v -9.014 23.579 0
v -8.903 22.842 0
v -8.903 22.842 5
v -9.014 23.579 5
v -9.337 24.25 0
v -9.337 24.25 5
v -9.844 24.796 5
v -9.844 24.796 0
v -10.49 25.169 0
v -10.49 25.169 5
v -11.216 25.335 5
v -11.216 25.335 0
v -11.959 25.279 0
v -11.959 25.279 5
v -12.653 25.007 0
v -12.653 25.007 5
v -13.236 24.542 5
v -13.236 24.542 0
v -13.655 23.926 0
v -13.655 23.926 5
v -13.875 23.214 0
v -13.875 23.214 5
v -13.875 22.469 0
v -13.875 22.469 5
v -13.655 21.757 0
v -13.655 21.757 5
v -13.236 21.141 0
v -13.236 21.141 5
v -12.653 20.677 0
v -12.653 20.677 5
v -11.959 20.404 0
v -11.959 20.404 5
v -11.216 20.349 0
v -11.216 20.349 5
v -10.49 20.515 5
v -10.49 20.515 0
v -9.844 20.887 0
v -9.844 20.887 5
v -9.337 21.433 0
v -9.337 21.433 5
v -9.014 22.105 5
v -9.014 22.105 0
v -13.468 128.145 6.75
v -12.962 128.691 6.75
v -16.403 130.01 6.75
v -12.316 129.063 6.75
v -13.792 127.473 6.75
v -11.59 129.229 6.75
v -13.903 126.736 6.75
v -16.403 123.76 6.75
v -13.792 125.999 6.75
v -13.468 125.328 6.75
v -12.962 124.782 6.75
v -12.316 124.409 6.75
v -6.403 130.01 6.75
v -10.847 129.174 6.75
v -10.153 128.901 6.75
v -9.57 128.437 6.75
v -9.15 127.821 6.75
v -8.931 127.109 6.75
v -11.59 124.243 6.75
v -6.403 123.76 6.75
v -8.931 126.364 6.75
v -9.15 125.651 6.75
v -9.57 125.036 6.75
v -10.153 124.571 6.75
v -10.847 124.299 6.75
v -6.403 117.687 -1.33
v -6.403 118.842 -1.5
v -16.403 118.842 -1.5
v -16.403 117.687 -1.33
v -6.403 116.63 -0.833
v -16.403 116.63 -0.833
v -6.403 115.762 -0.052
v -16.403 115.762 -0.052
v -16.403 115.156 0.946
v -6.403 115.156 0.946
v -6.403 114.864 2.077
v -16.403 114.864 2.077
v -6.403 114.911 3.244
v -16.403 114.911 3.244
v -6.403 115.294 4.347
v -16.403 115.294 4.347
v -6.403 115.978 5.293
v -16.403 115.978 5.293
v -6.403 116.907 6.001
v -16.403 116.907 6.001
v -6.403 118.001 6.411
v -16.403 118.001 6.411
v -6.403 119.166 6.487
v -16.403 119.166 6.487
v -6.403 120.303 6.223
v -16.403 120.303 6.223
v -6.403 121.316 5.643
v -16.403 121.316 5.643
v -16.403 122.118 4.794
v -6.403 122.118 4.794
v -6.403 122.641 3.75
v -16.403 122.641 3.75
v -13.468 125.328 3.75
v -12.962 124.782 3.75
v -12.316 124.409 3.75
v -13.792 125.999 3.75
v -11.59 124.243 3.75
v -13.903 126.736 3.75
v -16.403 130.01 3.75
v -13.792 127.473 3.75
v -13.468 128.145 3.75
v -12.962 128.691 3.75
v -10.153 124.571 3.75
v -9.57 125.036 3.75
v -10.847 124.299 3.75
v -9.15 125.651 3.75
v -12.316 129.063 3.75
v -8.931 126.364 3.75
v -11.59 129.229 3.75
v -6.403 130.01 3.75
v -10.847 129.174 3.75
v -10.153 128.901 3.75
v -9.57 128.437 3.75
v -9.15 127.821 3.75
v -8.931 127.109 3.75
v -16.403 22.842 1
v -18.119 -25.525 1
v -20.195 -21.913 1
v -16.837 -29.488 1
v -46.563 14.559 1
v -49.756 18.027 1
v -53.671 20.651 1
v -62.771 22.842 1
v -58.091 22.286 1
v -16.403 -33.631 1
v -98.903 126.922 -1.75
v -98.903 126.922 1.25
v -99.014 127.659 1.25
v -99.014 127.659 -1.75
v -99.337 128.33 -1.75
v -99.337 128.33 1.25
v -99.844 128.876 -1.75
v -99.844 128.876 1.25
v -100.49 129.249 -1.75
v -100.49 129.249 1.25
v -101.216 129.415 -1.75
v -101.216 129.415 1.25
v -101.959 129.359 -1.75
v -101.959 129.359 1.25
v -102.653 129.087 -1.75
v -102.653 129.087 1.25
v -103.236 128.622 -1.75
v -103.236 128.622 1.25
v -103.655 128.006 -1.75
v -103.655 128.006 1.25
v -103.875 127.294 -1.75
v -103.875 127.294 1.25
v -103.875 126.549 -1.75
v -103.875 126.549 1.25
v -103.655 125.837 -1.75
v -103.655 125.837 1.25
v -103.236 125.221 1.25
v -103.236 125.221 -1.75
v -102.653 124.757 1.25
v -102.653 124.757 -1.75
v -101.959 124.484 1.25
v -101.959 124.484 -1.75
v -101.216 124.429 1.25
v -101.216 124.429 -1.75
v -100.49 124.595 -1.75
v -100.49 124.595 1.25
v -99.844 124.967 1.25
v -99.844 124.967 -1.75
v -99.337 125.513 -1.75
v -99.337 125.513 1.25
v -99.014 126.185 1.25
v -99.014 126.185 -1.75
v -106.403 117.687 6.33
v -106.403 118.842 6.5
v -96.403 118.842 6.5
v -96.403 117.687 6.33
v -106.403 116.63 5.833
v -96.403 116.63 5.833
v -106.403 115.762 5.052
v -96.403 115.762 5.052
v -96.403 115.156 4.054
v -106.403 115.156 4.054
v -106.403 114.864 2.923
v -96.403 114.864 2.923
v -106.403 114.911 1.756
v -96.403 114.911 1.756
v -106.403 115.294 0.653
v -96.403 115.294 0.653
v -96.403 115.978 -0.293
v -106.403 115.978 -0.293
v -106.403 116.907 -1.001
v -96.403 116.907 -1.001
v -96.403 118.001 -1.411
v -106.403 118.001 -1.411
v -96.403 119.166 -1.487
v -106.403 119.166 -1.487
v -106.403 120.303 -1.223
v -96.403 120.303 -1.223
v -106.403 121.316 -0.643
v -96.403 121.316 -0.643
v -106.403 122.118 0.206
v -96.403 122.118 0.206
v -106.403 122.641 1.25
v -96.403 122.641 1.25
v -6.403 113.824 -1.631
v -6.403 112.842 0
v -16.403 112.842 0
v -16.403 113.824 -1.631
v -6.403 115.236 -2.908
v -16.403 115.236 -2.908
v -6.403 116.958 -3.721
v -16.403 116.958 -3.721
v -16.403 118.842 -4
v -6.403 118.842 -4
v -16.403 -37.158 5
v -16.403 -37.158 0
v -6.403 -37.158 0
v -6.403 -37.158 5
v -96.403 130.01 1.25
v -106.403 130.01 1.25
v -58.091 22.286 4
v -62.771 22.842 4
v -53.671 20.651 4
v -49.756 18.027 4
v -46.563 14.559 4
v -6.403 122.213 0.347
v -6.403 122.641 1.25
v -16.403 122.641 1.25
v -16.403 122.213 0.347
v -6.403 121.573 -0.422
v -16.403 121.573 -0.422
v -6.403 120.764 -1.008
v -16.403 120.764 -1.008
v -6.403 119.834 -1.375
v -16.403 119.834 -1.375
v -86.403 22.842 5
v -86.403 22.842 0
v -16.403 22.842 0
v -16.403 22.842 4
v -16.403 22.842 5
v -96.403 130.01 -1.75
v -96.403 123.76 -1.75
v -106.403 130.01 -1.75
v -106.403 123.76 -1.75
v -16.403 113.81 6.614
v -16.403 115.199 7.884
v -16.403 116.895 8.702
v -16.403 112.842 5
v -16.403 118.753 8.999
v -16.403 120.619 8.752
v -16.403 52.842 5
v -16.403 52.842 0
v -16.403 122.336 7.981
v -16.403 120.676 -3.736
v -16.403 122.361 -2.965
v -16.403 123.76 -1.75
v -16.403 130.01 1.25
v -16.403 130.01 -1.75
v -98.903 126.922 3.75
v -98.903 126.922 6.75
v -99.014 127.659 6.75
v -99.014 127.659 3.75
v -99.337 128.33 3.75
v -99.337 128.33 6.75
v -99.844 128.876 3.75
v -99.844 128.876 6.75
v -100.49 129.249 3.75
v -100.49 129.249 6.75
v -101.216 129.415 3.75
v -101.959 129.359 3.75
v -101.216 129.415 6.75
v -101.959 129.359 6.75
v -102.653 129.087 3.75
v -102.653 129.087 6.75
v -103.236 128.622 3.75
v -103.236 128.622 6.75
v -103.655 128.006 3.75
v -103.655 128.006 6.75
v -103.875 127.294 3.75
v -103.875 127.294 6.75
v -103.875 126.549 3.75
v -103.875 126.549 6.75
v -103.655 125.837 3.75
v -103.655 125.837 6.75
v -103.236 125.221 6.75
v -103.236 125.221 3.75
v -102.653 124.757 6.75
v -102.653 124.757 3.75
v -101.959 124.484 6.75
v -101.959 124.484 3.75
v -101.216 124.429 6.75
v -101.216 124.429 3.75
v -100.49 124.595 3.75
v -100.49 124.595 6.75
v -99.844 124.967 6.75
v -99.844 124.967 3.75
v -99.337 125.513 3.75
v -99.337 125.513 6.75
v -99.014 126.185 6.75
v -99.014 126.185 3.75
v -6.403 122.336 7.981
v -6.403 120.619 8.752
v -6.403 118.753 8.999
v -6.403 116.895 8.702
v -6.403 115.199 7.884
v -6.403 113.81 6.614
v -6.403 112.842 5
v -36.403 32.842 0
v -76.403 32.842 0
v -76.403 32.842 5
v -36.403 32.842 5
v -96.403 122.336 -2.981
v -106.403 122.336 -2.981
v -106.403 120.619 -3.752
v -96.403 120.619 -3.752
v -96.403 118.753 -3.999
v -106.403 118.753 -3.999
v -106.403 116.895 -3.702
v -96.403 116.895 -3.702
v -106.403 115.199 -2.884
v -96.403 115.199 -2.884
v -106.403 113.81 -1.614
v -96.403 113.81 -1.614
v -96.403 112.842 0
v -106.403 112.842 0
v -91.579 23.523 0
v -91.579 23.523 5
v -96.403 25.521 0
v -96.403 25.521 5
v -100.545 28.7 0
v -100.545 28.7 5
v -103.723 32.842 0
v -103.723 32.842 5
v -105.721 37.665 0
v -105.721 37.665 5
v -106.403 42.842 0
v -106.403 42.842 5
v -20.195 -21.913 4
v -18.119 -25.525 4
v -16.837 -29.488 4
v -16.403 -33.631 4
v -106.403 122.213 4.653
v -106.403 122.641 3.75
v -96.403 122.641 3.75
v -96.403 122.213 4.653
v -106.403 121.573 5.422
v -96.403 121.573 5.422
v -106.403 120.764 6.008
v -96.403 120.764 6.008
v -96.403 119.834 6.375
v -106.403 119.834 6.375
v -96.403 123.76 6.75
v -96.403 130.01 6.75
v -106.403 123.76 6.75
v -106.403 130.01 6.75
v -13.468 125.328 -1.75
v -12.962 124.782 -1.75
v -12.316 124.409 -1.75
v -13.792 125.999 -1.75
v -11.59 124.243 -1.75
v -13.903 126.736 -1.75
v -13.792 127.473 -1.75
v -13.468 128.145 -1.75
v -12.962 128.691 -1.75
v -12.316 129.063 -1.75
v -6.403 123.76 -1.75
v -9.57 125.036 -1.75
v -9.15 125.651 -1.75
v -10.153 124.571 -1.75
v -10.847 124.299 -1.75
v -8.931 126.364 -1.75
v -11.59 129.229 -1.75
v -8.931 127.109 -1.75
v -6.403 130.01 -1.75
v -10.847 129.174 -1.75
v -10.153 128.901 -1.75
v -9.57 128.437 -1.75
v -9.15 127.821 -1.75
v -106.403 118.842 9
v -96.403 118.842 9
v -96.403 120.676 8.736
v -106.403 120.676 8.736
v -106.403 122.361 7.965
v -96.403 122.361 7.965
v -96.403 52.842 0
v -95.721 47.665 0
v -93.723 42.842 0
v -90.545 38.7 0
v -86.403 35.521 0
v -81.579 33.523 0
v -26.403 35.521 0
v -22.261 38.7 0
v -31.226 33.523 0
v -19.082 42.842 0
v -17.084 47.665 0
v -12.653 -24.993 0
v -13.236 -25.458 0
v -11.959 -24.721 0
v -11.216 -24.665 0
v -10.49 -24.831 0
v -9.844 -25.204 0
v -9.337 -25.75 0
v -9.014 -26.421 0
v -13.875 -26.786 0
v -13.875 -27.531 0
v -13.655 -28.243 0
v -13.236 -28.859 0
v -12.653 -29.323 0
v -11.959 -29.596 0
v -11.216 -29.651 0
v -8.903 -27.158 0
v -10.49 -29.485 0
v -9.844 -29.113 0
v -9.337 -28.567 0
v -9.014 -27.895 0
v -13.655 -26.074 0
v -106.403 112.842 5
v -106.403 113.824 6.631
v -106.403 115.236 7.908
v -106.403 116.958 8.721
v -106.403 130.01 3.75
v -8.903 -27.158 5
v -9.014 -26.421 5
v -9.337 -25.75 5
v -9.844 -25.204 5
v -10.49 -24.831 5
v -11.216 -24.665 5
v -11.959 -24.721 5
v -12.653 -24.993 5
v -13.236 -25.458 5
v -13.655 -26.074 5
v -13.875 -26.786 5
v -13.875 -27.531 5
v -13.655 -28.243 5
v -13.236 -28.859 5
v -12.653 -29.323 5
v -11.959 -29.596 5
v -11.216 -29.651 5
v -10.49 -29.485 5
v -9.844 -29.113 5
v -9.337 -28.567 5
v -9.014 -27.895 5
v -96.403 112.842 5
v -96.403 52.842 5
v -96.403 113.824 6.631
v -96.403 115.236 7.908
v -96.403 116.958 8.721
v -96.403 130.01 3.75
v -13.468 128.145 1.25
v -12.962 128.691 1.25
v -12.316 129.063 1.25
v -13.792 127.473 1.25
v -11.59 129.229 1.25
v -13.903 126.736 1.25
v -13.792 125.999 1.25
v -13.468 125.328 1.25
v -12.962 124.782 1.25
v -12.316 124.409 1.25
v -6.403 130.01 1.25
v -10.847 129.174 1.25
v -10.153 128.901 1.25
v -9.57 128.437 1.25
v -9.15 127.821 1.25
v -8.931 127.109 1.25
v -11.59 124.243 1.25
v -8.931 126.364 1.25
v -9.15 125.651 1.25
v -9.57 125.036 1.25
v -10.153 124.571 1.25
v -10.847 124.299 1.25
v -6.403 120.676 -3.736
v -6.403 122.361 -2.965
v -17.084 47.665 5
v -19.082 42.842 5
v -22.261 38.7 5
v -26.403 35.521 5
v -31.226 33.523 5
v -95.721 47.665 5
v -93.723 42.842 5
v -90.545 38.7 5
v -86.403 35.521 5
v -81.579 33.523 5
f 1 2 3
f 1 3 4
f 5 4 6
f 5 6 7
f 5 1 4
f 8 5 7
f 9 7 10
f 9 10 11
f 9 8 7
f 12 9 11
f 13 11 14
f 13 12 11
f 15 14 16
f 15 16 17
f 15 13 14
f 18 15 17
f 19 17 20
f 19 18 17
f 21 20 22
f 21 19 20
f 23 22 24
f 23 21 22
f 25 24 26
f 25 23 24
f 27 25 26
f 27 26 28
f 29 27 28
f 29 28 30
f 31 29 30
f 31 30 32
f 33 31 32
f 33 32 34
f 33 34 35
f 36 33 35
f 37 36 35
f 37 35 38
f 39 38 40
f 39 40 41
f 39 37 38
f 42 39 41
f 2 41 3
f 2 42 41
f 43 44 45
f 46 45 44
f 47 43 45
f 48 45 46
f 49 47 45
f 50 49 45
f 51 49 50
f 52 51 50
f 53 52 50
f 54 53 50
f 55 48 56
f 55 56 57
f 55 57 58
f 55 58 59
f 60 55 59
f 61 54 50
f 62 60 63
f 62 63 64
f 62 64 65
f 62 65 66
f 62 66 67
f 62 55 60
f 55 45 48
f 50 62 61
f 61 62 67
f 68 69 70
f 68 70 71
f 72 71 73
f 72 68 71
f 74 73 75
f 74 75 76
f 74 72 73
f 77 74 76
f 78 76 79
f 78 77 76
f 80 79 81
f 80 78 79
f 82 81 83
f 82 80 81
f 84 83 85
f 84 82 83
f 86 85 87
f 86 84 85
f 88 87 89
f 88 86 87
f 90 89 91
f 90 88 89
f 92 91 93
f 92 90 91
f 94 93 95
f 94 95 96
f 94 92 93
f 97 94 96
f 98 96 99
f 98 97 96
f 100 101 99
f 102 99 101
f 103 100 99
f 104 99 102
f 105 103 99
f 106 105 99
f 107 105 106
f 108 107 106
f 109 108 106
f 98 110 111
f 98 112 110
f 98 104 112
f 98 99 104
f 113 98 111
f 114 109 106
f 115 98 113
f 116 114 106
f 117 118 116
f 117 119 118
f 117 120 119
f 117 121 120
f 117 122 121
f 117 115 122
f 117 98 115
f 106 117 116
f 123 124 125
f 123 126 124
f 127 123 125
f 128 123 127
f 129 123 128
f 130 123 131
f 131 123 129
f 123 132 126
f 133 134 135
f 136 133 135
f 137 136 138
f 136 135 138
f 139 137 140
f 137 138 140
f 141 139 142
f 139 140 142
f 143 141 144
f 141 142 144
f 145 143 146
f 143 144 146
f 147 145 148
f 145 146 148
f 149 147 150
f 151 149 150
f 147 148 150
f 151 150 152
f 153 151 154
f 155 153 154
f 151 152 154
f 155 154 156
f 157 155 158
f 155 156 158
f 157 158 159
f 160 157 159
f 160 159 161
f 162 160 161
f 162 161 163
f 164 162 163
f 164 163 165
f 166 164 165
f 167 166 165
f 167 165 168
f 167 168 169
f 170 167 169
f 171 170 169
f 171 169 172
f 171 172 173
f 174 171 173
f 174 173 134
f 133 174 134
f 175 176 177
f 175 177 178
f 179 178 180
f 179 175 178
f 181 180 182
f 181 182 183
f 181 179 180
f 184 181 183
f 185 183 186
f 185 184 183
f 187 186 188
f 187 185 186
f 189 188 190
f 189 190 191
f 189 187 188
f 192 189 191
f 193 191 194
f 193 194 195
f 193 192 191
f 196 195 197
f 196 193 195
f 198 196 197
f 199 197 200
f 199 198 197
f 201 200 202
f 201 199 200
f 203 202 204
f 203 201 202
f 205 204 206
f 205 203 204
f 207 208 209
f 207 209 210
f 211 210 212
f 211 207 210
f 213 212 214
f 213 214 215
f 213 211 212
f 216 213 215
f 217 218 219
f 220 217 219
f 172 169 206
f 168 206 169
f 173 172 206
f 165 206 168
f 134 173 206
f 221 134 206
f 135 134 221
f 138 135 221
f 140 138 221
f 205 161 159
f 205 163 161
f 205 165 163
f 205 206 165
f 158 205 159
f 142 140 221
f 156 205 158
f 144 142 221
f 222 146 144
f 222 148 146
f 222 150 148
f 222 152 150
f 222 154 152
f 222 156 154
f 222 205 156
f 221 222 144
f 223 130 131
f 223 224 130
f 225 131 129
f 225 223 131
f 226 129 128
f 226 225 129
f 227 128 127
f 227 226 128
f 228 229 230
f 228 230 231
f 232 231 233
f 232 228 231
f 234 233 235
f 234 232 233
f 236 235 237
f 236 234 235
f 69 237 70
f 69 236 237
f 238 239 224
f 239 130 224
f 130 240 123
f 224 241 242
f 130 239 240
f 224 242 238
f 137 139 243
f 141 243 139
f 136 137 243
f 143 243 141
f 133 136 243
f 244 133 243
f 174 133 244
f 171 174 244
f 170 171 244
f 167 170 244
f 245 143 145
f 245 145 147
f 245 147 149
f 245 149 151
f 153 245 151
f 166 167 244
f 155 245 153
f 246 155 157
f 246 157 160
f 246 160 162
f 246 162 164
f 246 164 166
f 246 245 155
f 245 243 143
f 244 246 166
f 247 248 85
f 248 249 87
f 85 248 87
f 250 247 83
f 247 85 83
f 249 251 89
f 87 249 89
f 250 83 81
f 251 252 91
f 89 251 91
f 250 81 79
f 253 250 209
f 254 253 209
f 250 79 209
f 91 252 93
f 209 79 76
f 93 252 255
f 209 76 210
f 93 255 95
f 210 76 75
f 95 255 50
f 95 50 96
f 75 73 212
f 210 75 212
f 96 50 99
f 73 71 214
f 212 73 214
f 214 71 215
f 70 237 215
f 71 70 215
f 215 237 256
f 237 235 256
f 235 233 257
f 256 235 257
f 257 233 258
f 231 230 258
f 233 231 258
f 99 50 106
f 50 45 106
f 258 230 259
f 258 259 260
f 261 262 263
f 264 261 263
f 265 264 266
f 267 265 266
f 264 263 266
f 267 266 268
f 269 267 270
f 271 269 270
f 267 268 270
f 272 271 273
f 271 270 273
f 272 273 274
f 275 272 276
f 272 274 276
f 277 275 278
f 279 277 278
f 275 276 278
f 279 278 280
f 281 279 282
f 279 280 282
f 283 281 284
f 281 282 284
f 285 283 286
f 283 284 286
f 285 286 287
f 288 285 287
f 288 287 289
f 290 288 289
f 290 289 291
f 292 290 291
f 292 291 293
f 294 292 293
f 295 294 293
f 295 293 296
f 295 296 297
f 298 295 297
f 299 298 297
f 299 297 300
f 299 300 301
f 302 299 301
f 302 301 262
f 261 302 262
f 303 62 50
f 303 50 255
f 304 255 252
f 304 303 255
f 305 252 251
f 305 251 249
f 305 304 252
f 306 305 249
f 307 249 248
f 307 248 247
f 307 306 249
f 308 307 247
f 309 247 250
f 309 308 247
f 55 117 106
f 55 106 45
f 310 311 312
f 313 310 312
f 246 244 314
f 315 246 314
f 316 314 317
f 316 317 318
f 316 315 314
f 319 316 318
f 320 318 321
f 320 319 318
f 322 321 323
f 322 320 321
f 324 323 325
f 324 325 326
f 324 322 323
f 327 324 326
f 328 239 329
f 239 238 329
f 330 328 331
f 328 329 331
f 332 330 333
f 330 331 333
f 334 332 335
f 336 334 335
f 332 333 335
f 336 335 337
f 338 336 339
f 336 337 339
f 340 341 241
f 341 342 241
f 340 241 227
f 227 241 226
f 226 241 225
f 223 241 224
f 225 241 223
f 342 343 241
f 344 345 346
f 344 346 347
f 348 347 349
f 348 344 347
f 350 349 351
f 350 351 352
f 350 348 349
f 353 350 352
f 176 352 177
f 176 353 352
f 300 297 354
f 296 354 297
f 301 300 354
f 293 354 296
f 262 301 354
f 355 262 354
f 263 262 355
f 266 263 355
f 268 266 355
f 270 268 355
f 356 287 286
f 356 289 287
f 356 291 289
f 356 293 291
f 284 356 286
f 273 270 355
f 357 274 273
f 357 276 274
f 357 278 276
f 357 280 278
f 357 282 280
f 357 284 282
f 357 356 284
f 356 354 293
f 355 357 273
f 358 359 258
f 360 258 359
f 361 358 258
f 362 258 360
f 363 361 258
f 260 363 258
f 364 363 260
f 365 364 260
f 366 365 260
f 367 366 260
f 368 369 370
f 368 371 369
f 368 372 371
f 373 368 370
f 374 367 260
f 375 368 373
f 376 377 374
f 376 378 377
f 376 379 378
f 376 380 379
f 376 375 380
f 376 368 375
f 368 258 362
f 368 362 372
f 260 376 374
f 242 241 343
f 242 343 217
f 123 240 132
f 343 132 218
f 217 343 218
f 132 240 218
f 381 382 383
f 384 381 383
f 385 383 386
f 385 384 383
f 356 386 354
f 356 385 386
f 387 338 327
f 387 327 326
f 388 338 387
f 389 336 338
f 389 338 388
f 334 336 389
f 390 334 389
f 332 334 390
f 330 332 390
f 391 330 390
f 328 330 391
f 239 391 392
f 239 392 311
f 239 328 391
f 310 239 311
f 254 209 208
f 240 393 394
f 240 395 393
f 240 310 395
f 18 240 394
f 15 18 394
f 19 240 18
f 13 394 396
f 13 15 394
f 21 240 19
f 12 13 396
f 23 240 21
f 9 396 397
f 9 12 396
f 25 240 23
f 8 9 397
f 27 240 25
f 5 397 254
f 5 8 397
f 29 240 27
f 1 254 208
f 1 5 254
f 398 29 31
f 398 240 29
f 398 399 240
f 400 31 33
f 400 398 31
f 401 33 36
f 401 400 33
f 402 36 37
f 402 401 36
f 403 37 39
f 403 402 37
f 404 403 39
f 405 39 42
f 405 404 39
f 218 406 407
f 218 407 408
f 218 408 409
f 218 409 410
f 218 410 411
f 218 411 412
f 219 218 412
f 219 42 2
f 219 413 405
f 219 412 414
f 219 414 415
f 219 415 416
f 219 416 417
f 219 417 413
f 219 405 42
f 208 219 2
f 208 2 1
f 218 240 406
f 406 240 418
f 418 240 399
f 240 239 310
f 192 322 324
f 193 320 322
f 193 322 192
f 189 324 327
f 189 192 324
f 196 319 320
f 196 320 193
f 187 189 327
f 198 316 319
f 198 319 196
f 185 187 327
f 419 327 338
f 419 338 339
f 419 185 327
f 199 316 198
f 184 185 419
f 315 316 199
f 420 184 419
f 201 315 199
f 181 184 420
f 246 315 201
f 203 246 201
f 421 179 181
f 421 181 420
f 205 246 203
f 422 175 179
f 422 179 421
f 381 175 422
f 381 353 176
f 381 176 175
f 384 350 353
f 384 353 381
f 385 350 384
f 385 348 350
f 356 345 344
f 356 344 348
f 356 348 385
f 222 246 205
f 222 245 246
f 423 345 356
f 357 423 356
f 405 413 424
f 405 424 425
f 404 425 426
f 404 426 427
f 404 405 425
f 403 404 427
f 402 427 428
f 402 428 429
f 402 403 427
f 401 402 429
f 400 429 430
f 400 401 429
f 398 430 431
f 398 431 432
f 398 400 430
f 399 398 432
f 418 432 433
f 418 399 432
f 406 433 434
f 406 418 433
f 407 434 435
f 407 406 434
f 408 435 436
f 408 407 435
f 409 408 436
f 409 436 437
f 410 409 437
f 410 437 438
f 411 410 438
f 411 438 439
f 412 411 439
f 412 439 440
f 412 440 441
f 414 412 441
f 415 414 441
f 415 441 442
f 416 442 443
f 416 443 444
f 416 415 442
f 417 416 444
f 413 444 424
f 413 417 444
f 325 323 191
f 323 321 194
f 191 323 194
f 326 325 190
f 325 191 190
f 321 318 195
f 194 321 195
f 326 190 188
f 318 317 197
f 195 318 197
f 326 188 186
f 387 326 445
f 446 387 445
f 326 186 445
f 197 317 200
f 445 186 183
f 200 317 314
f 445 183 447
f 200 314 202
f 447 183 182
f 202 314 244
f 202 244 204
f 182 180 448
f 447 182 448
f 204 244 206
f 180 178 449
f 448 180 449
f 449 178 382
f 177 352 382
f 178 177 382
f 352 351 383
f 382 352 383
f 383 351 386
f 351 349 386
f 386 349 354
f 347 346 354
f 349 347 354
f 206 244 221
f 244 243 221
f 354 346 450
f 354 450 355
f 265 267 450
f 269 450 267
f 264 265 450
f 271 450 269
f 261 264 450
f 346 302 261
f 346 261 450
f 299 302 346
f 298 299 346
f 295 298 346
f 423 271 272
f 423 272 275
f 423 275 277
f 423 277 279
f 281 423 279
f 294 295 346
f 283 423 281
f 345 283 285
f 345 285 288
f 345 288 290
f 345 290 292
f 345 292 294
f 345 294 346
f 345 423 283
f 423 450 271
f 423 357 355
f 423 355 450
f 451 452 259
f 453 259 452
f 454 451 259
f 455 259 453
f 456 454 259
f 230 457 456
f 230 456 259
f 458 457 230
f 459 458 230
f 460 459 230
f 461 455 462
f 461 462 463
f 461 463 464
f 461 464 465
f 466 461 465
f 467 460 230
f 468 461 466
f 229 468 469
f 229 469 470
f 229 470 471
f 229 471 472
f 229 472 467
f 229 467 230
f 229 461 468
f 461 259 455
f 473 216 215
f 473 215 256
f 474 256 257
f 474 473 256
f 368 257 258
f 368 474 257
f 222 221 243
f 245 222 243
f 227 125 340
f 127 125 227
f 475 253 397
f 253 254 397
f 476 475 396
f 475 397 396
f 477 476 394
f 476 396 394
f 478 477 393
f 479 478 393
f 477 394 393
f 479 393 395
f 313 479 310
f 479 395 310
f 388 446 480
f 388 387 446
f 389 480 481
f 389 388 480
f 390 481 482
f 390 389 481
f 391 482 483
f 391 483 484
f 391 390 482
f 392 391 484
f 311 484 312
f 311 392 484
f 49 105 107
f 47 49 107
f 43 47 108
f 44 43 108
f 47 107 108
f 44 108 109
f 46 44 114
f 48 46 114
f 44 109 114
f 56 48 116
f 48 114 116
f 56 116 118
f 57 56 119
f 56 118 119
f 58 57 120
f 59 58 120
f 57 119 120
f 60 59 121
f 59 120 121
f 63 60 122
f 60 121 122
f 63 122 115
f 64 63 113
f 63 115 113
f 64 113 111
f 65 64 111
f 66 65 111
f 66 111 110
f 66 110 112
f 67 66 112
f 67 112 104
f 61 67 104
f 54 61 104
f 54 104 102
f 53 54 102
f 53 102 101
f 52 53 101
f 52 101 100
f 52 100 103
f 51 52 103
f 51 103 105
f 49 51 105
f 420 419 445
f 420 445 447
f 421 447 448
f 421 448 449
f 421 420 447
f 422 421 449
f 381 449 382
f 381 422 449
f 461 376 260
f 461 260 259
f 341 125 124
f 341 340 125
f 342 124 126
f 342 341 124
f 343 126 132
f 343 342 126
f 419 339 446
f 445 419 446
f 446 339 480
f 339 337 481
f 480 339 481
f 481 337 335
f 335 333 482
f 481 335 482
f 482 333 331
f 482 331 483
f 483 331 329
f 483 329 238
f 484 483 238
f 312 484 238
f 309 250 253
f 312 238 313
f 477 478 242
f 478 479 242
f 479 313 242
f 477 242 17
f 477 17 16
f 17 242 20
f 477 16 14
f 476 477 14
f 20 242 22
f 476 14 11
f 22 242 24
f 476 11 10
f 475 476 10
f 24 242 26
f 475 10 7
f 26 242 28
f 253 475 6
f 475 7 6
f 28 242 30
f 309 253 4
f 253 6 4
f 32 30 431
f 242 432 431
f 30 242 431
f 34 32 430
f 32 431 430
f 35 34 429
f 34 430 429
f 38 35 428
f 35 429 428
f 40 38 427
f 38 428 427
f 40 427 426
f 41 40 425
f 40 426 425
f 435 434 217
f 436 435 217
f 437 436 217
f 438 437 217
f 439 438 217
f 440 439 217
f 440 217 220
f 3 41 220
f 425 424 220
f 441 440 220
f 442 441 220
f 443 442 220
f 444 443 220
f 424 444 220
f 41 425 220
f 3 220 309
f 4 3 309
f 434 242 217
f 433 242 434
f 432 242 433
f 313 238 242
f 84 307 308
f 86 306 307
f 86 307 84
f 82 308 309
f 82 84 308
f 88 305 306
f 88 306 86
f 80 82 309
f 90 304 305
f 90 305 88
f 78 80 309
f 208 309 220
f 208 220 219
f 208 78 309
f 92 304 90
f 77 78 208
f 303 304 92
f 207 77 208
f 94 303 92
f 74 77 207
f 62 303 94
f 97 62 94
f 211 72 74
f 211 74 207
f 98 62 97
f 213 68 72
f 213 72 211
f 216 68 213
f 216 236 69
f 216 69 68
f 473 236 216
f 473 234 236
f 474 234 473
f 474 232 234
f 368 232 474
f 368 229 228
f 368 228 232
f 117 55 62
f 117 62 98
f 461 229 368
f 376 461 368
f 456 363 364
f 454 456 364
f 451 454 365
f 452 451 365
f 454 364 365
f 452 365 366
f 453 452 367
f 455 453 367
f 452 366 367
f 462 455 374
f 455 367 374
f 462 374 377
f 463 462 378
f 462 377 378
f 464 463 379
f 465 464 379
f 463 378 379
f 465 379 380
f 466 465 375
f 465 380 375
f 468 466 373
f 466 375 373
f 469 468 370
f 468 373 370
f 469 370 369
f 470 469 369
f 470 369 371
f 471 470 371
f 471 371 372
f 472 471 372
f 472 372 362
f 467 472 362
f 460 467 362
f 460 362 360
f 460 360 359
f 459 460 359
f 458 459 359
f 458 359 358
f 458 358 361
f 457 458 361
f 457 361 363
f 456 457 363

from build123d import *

# Parameters (mm, degrees)
SKETCH1_W           = 10
SKETCH1_H           = 70
SKETCH1_R           = 2.5
BOSS_EXTRUDE1_DEPTH = 5
SKETCH2_W           = 5
SKETCH2_H           = 10
BOSS_EXTRUDE2_DEPTH = 90
BOSS_EXTRUDE3_DEPTH = 4
SKETCH5_W           = 10
SKETCH5_H           = 5
BOSS_EXTRUDE4_DEPTH = 80
BOSS_EXTRUDE5_DEPTH = 10
SKETCH7_R           = 2.5
CUT_EXTRUDE1_DEPTH  = 10
BOSS_EXTRUDE6_DEPTH = 10
SKETCH9_R           = 2.5
CUT_EXTRUDE2_DEPTH  = 10
CUT_EXTRUDE3_DEPTH  = 1
FILLET1_R           = 20


with BuildPart() as part:
    # Sketch1 → Boss-Extrude1 (new body)
    with BuildSketch(Plane.XY):
        with Locations((-11.402877698, -2.158273381)):
            Rectangle(SKETCH1_W, SKETCH1_H)
        with Locations((-11.402877698, 22.841726619)):
            Circle(SKETCH1_R, mode=Mode.SUBTRACT)
        with Locations((-11.402877698, -27.158273381)):
            Circle(SKETCH1_R, mode=Mode.SUBTRACT)
    extrude(amount=BOSS_EXTRUDE1_DEPTH)

    # Sketch2 → Boss-Extrude2 (add)
    with BuildSketch(Plane.ZY.offset(16.402877698)):
        with Locations((2.5, 27.841726619)):
            Rectangle(SKETCH2_W, SKETCH2_H)
    extrude(amount=BOSS_EXTRUDE2_DEPTH)

    # Sketch3 → Boss-Extrude3 (add)
    with BuildSketch(Plane(origin=(0, 0, 0), x_dir=(-1, 0, 0), z_dir=(0, 0, -1))):
        Polygon((16.402877698, -27.158273381), (52.551297267, 22.841726619), (16.402877698, 22.841726619), align=None)
    extrude(amount=-BOSS_EXTRUDE3_DEPTH)

    # Sketch5 → Boss-Extrude4 (add)
    with BuildSketch(Plane(origin=(0, 32.841726619, 0), x_dir=(1, 0, 0), z_dir=(0, 1, 0))):
        with Locations((-11.402877698, -2.5)):
            Rectangle(SKETCH5_W, SKETCH5_H)
        with Locations((-101.402877698, -2.5)):
            Rectangle(SKETCH5_W, SKETCH5_H)
    extrude(amount=BOSS_EXTRUDE4_DEPTH)

    # Sketch6 → Boss-Extrude5 (add)
    with BuildSketch(Plane(origin=(-6.402877698, 0, 0), x_dir=(0, 0, -1), z_dir=(1, 0, 0))):
        with BuildLine():
            Line((-6.75, 130.009805512), (-6.75, 123.759805512))
            ThreePointArc((-6.75, 123.759805512), (-5.34531818, 124.685883055), (-3.75, 125.22040203))
            Line((-3.75, 125.22040203), (-3.75, 130.009805512))
            Line((-3.75, 130.009805512), (-6.75, 130.009805512))
        make_face()
        with BuildLine():
            ThreePointArc((-3.75, 125.22040203), (-5.34531818, 124.685883055), (-6.75, 123.759805512))
            ThreePointArc((-6.75, 123.759805512), (-8.918078893, 117.813007357), (-5, 112.841726619))
            Line((-5, 112.841726619), (0, 112.841726619))
            ThreePointArc((0, 112.841726619), (2.908326913, 115.236175343), (4, 118.841726619))
            ThreePointArc((4, 118.841726619), (3.410795209, 121.545890075), (1.75, 123.759805512))
            ThreePointArc((1.75, 123.759805512), (0.34531818, 124.685883055), (-1.25, 125.22040203))
            Line((-1.25, 125.22040203), (-1.25, 122.641397657))
            ThreePointArc((-1.25, 122.641397657), (0.740370349, 121.186934499), (1.5, 118.841726619))
            ThreePointArc((1.5, 118.841726619), (-4.84520788, 115.60135627), (-3.75, 122.641397657))
            Line((-3.75, 122.641397657), (-3.75, 125.22040203))
        make_face()
        with BuildLine():
            Line((-1.25, 130.009805512), (-1.25, 125.22040203))
            ThreePointArc((-1.25, 125.22040203), (0.34531818, 124.685883055), (1.75, 123.759805512))
            Line((1.75, 123.759805512), (1.75, 130.009805512))
            Line((1.75, 130.009805512), (-1.25, 130.009805512))
        make_face()
    extrude(amount=-BOSS_EXTRUDE5_DEPTH)

    # Sketch7 → Cut-Extrude1 (cut)
    with BuildSketch(Plane(origin=(0, 0, -1.75), x_dir=(-1, 0, 0), z_dir=(0, 0, -1))):
        with Locations((11.402877698, 126.736200343)):
            Circle(SKETCH7_R)
    extrude(amount=-CUT_EXTRUDE1_DEPTH, mode=Mode.SUBTRACT)

    # Sketch8 → Boss-Extrude6 (add)
    with BuildSketch(Plane.ZY.offset(106.402877698)):
        with BuildLine():
            ThreePointArc((1.25, 125.22040203), (-0.34531818, 124.685883055), (-1.75, 123.759805512))
            ThreePointArc((-1.75, 123.759805512), (-3.918078893, 117.813007357), (0, 112.841726619))
            Line((0, 112.841726619), (5, 112.841726619))
            ThreePointArc((5, 112.841726619), (7.908326913, 115.236175343), (9, 118.841726619))
            ThreePointArc((9, 118.841726619), (8.410795209, 121.545890075), (6.75, 123.759805512))
            ThreePointArc((6.75, 123.759805512), (5.34531818, 124.685883055), (3.75, 125.22040203))
            Line((3.75, 125.22040203), (3.75, 122.641397657))
            ThreePointArc((3.75, 122.641397657), (5.740370349, 121.186934499), (6.5, 118.841726619))
            ThreePointArc((6.5, 118.841726619), (0.15479212, 115.60135627), (1.25, 122.641397657))
            Line((1.25, 122.641397657), (1.25, 125.22040203))
        make_face()
        with BuildLine():
            Line((1.25, 130.009805512), (-1.75, 130.009805512))
            Line((-1.75, 130.009805512), (-1.75, 123.759805512))
            ThreePointArc((-1.75, 123.759805512), (-0.34531818, 124.685883055), (1.25, 125.22040203))
            Line((1.25, 125.22040203), (1.25, 130.009805512))
        make_face()
        with BuildLine():
            Line((3.75, 130.009805512), (3.75, 125.22040203))
            ThreePointArc((3.75, 125.22040203), (5.34531818, 124.685883055), (6.75, 123.759805512))
            Line((6.75, 123.759805512), (6.75, 130.009805512))
            Line((6.75, 130.009805512), (3.75, 130.009805512))
        make_face()
    extrude(amount=-BOSS_EXTRUDE6_DEPTH)

    # Sketch9 → Cut-Extrude2 (cut)
    with BuildSketch(Plane.XY.offset(6.75)):
        with Locations((-101.402877698, 126.921763381)):
            Circle(SKETCH9_R)
    extrude(amount=-CUT_EXTRUDE2_DEPTH, mode=Mode.SUBTRACT)

    # Sketch10 → Cut-Extrude3 (cut)
    with BuildSketch(Plane(origin=(0, 0, 0), x_dir=(-1, 0, 0), z_dir=(0, 0, -1))):
        Polygon((16.402877698, -27.158273381), (52.551297267, 22.841726619), (16.402877698, 22.841726619), align=None)
    extrude(amount=-CUT_EXTRUDE3_DEPTH, mode=Mode.SUBTRACT)

    # Fillet1
    fillet1_edges = [part.edges().sort_by_distance(p)[0] for p in [
        (-106.402877698, 22.841726619, 2.5),
        (-16.402877698, -27.158273381, 2.5),
        (-52.551297267, 22.841726619, 2.5),
        (-96.402877698, 32.841726619, 2.5),
        (-16.402877698, 32.841726619, 2.5),
    ]]
    fillet(fillet1_edges, radius=FILLET1_R)


solid = part.part
